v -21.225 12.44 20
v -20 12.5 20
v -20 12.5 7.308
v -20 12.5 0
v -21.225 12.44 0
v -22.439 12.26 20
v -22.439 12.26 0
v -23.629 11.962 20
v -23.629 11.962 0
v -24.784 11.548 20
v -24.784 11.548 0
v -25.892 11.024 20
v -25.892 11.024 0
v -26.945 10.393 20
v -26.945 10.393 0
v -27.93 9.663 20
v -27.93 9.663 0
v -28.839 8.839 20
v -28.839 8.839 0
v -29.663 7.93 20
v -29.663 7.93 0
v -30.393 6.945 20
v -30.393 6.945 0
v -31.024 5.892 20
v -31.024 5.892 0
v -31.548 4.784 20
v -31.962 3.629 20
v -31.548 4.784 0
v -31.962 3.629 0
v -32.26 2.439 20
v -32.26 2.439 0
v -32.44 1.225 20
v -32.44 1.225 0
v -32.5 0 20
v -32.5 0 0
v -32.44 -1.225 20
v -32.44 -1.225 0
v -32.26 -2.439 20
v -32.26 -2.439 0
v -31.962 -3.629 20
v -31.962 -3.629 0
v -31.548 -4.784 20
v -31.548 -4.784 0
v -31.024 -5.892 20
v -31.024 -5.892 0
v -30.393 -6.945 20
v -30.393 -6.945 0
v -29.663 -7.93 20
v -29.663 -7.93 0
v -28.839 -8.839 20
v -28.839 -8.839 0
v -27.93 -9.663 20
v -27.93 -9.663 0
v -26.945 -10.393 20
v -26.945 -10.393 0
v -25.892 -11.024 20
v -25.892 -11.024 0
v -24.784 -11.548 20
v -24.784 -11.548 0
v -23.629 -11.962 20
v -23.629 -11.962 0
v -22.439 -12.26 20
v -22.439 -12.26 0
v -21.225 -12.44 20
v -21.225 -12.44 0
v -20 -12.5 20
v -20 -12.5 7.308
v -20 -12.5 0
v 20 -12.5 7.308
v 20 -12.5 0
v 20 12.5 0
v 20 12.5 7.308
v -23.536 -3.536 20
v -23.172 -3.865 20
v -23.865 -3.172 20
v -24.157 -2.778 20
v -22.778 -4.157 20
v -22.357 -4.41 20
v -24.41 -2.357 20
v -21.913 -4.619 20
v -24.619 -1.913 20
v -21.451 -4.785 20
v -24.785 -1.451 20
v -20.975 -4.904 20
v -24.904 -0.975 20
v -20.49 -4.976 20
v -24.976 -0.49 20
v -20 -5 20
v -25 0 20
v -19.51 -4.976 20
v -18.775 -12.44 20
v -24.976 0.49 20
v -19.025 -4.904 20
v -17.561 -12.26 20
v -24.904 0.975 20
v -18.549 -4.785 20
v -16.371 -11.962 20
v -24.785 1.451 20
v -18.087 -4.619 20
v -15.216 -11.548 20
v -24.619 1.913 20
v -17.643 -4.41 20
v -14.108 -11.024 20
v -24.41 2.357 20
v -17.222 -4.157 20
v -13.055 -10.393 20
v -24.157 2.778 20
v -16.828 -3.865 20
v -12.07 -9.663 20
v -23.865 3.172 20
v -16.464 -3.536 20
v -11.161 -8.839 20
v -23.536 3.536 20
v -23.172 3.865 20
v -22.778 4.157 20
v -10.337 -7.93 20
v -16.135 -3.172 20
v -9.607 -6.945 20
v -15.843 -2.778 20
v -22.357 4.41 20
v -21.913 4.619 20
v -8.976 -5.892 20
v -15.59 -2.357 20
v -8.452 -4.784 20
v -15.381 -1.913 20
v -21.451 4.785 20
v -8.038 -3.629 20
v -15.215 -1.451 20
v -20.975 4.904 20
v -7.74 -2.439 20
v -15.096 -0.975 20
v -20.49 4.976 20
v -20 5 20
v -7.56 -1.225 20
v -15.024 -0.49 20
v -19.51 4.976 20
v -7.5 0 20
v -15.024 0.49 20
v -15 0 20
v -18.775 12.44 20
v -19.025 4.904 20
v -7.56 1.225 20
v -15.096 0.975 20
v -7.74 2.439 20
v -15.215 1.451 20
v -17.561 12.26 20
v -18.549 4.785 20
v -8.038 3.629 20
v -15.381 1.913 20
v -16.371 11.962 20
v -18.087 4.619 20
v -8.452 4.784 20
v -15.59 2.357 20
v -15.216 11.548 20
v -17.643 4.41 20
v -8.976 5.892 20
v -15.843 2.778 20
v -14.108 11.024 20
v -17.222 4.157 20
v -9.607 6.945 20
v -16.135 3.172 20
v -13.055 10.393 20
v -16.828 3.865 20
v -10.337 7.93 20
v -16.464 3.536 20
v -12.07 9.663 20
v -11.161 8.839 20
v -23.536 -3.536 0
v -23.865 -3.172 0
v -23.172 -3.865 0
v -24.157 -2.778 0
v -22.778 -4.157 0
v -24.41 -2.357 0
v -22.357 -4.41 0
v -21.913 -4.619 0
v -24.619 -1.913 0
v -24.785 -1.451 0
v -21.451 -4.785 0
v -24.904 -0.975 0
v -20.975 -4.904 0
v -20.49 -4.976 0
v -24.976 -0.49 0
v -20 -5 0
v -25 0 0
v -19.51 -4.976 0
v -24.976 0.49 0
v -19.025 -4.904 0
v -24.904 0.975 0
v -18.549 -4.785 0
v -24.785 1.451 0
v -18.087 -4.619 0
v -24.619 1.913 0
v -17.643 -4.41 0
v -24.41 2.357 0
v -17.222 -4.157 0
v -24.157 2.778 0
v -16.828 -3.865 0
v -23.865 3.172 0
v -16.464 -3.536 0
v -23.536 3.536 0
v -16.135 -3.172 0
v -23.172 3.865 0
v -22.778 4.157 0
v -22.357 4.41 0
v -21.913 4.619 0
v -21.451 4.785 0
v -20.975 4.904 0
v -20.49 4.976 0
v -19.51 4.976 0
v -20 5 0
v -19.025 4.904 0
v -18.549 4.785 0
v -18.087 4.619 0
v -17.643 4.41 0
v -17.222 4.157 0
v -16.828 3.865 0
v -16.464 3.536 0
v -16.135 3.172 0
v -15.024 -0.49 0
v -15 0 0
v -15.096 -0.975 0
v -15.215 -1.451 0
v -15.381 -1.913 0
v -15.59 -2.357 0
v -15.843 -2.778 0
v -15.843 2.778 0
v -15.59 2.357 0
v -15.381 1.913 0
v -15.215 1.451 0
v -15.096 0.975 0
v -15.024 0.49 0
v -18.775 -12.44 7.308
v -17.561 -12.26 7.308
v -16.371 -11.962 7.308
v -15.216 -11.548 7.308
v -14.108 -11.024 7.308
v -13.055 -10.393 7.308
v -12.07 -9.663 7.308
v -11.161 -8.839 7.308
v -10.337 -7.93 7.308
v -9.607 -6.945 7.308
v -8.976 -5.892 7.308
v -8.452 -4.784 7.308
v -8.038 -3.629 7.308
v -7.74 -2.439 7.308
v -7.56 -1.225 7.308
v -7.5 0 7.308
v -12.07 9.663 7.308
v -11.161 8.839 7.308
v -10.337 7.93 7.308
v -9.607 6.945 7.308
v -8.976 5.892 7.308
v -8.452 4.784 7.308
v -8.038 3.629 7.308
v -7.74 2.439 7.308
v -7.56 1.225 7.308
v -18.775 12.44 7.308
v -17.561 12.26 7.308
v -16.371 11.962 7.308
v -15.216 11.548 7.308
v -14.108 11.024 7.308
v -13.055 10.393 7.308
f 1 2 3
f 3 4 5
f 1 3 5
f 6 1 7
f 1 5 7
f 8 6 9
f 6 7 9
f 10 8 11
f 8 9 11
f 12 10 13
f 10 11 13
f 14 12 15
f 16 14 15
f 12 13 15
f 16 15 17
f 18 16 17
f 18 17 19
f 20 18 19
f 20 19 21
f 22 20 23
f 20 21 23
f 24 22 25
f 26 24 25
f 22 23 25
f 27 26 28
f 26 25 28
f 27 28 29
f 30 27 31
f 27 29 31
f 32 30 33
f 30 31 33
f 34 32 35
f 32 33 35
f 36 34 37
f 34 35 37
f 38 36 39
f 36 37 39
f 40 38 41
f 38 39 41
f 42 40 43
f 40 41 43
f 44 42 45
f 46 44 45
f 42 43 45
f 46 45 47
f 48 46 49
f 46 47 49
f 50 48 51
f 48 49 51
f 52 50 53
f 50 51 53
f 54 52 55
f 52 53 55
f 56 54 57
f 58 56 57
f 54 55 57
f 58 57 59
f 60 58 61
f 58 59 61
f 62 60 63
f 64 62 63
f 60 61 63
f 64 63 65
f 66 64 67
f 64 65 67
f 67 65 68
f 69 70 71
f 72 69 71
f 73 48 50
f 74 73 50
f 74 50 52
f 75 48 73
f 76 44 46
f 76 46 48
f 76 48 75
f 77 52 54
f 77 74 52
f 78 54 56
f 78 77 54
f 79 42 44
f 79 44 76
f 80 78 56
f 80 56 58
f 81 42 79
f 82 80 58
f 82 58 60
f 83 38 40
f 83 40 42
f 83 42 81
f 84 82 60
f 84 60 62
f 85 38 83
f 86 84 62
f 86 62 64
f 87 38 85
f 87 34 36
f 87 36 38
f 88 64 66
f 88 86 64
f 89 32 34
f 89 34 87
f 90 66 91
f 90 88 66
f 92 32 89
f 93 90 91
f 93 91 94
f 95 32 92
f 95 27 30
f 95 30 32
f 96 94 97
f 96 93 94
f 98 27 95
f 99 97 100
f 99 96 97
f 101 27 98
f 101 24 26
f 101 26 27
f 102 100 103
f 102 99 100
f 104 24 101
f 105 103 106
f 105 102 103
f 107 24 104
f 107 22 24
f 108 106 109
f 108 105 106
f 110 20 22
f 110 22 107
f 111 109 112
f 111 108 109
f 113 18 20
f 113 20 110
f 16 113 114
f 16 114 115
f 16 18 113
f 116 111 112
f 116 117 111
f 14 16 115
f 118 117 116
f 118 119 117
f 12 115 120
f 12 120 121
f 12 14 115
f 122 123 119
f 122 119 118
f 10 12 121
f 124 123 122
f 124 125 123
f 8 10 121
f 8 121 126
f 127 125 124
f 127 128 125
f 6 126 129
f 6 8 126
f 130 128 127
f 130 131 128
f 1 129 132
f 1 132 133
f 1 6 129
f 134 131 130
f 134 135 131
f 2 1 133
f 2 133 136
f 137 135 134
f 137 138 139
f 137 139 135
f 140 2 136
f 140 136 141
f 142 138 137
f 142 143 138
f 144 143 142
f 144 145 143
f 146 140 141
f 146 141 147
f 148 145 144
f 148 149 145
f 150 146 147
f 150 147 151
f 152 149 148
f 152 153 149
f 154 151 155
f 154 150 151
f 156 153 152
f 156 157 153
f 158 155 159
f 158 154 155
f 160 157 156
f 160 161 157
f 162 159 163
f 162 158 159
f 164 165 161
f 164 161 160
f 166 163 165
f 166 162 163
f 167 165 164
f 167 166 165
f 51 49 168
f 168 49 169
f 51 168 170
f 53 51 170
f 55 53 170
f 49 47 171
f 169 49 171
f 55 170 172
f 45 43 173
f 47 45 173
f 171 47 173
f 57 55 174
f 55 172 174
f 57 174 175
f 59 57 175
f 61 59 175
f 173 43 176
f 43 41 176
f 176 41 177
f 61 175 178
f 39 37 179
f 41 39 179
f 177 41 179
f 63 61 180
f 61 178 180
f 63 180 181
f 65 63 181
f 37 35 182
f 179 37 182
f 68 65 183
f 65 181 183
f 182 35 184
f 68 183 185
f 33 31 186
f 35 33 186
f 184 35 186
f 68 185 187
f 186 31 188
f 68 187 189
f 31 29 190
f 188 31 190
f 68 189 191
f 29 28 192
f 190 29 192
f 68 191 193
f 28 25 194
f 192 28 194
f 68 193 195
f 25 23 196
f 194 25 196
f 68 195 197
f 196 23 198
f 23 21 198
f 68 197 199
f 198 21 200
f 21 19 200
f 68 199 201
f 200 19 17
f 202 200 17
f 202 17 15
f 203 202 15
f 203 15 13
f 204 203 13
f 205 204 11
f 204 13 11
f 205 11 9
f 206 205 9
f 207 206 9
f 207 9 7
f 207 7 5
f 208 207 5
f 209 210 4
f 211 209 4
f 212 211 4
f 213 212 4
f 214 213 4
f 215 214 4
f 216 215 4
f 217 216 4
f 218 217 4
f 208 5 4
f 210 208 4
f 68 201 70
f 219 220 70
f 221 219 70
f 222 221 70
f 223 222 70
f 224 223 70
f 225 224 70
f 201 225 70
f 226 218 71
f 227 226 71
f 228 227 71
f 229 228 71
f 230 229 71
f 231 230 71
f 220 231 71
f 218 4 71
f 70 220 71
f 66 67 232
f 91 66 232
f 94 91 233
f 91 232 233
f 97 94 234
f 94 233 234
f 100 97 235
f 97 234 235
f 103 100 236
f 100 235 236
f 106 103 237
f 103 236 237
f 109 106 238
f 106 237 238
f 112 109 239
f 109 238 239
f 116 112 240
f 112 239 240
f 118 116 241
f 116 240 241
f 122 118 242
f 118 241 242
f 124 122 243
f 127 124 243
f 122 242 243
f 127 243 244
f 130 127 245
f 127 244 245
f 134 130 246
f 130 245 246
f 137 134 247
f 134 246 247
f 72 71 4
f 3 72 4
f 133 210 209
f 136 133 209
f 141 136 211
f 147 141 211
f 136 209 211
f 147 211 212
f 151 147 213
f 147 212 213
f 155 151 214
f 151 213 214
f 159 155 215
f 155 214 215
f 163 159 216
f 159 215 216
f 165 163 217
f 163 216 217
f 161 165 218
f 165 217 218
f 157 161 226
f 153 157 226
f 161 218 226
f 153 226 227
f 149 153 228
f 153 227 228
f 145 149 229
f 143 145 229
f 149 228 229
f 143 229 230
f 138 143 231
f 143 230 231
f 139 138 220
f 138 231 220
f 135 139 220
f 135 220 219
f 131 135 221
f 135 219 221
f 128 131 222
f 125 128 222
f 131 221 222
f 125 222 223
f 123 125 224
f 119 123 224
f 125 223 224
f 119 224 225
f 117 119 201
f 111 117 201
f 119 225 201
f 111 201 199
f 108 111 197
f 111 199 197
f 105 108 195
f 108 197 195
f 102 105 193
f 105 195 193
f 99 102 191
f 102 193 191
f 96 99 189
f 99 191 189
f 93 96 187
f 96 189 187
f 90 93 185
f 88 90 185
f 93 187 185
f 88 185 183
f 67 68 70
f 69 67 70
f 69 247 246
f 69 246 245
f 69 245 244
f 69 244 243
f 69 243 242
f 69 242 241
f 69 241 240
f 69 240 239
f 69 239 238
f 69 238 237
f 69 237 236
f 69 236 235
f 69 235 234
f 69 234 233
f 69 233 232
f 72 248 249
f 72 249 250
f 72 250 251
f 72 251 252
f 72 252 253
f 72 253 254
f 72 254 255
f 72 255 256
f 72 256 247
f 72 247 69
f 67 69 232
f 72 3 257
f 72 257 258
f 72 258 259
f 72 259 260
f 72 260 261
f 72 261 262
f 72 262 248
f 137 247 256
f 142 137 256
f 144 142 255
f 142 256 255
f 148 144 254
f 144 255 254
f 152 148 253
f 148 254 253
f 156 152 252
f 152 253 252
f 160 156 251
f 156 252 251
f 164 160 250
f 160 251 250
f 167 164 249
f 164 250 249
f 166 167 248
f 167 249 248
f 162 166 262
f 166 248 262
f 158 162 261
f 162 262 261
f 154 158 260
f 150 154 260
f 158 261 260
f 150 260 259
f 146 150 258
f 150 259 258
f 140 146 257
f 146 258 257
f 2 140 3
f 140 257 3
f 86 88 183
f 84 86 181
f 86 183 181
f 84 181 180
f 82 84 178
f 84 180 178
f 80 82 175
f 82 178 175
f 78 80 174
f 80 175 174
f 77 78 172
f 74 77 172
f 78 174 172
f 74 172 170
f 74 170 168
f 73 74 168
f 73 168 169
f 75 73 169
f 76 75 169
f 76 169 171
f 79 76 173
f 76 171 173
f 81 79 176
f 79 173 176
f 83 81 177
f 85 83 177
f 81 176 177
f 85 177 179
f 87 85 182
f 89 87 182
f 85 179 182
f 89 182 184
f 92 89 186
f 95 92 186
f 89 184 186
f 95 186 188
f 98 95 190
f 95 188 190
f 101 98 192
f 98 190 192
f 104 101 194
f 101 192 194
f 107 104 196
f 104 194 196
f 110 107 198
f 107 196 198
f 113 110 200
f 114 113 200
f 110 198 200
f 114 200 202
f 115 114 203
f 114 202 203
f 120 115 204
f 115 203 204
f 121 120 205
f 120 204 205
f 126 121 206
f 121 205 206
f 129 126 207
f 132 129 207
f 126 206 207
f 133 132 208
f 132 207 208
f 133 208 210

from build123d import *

# Parameters (mm, degrees)
F2_DEPTH = 7.30791
F3_DEPTH = 20


with BuildPart() as f2:
    # F0 (on Top) → F2 (new body)
    with BuildSketch(Plane.XY):
        with BuildLine():
            Line((-20, -12.5), (20, -12.5))
            Line((20, -12.5), (20, 12.5))
            Line((20, 12.5), (-20, 12.5))
            ThreePointArc((-20, 12.5), (-11.161165, 8.838835), (-7.5, 0))
            ThreePointArc((-7.5, 0), (-11.161165, -8.838835), (-20, -12.5))
        make_face()
        with BuildLine():
            ThreePointArc((-20, 12.5), (-32.5, 0), (-20, -12.5))
            Line((-20, -12.5), (-20, -5))
            ThreePointArc((-20, -5), (-25, 0), (-20, 5))
            Line((-20, 5), (-20, 12.5))
        make_face()
        with BuildLine():
            Line((-20, -5), (-20, -12.5))
            ThreePointArc((-20, -12.5), (-11.161165, -8.838835), (-7.5, 0))
            ThreePointArc((-7.5, 0), (-11.161165, 8.838835), (-20, 12.5))
            Line((-20, 12.5), (-20, 5))
            ThreePointArc((-20, 5), (-16.464466, 3.535534), (-15, 0))
            ThreePointArc((-15, 0), (-16.464466, -3.535534), (-20, -5))
        make_face()
    extrude(amount=F2_DEPTH)

    # F0 (on Top) → F3 (join)
    with BuildSketch(Plane.XY):
        with BuildLine():
            Line((-20, -5), (-20, -12.5))
            ThreePointArc((-20, -12.5), (-11.161165, -8.838835), (-7.5, 0))
            ThreePointArc((-7.5, 0), (-11.161165, 8.838835), (-20, 12.5))
            Line((-20, 12.5), (-20, 5))
            ThreePointArc((-20, 5), (-16.464466, 3.535534), (-15, 0))
            ThreePointArc((-15, 0), (-16.464466, -3.535534), (-20, -5))
        make_face()
        with BuildLine():
            ThreePointArc((-20, 12.5), (-32.5, 0), (-20, -12.5))
            Line((-20, -12.5), (-20, -5))
            ThreePointArc((-20, -5), (-25, 0), (-20, 5))
            Line((-20, 5), (-20, 12.5))
        make_face()
    extrude(amount=F3_DEPTH)


solid = f2.part
